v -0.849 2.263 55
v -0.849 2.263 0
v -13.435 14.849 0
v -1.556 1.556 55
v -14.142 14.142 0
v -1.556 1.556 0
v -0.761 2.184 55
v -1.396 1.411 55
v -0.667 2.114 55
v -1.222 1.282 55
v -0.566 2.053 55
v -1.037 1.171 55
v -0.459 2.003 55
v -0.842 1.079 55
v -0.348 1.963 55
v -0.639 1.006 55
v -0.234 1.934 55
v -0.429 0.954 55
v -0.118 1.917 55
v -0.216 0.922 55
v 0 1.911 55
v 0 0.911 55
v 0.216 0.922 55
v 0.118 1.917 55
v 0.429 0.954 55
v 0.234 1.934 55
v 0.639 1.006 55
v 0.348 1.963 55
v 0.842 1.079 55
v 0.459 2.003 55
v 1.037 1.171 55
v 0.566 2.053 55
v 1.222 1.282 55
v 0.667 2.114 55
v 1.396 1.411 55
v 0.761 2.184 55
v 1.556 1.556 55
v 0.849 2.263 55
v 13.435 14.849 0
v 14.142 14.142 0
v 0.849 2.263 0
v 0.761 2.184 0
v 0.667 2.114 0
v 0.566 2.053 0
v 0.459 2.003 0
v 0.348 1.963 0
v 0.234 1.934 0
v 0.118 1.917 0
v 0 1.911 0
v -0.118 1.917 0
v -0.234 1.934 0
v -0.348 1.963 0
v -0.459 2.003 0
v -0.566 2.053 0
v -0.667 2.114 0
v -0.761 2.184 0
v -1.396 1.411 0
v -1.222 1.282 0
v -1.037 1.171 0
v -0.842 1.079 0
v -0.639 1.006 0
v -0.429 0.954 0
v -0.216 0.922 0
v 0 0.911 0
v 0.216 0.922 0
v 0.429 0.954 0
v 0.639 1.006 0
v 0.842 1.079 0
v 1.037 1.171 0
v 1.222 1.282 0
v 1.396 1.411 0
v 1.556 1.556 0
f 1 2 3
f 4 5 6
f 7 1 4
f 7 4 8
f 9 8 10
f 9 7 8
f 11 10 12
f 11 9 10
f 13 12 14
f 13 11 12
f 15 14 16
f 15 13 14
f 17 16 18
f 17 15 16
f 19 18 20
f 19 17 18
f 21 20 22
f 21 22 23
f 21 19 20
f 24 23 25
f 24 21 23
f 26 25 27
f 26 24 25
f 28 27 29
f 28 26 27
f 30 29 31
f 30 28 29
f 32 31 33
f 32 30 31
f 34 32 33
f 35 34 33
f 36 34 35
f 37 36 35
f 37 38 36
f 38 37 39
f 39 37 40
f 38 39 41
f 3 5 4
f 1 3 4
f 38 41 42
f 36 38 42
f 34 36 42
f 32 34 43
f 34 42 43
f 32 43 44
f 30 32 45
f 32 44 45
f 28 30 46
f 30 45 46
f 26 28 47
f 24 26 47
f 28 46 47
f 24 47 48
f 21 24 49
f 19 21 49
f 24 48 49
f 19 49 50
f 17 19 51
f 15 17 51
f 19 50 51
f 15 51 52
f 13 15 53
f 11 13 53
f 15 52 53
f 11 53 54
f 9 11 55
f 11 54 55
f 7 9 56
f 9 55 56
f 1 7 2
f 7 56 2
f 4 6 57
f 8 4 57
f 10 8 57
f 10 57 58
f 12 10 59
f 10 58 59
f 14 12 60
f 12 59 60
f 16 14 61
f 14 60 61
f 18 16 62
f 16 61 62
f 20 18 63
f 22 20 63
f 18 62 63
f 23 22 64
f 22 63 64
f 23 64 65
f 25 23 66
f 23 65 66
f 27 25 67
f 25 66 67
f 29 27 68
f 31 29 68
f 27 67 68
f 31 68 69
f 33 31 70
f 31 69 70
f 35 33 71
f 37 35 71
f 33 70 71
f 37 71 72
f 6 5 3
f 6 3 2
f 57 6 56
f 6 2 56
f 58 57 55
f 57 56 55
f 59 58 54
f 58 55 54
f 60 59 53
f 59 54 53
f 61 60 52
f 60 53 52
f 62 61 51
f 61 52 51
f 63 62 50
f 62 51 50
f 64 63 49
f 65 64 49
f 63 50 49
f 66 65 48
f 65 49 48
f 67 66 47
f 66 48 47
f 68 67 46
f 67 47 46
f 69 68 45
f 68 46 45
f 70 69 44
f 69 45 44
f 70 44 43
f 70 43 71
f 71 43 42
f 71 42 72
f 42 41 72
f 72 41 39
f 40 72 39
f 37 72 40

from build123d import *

# Parameters (mm, degrees)
BASE_FLANGE1_DEPTH = 55
CUT_EXTRUDE1_DEPTH = 10
CUT_EXTRUDE2_DEPTH = 10


# Read off the part's stored shape, not the designer's step: Base-Flange1
with BuildPart() as part:
    # Base-Flange1 outline → Base-Flange1 (new body)
    with BuildSketch(Plane.XY):
        with BuildLine():
            Line((-0.848528137, 2.2627417), (-13.435028843, 14.849242405))
            Line((-13.435028843, 14.849242405), (-14.142135624, 14.142135624))
            Line((-14.142135624, 14.142135624), (-1.555634919, 1.555634919))
            ThreePointArc((-1.555634919, 1.555634919), (0, 0.911269837), (1.555634919, 1.555634919))
            Line((1.555634919, 1.555634919), (14.142135624, 14.142135624))
            Line((14.142135624, 14.142135624), (13.435028843, 14.849242405))
            Line((13.435028843, 14.849242405), (0.848528137, 2.2627417))
            ThreePointArc((0.848528137, 2.2627417), (0, 1.911269837), (-0.848528137, 2.2627417))
        make_face()
    extrude(amount=BASE_FLANGE1_DEPTH)

    # Sketch6 → Cut-Extrude1 (cut)
    with BuildSketch(Plane(origin=(0, 0, 0), x_dir=(0, 0, 1), z_dir=(-0.7071067811865477, -0.7071067811865475, 0))):
        Polygon((0, 20), (55, 2.2), (55, 20), align=None)
    extrude(amount=-CUT_EXTRUDE1_DEPTH, mode=Mode.SUBTRACT)

    # Sketch7 → Cut-Extrude2 (cut)
    with BuildSketch(Plane(origin=(0, 0, 0), x_dir=(0, 0, -1), z_dir=(0.7071067811865488, -0.7071067811865462, 0))):
        Polygon((-55, 2.2), (0, 20), (-55, 20), align=None)
    extrude(amount=-CUT_EXTRUDE2_DEPTH, mode=Mode.SUBTRACT)


solid = part.part
